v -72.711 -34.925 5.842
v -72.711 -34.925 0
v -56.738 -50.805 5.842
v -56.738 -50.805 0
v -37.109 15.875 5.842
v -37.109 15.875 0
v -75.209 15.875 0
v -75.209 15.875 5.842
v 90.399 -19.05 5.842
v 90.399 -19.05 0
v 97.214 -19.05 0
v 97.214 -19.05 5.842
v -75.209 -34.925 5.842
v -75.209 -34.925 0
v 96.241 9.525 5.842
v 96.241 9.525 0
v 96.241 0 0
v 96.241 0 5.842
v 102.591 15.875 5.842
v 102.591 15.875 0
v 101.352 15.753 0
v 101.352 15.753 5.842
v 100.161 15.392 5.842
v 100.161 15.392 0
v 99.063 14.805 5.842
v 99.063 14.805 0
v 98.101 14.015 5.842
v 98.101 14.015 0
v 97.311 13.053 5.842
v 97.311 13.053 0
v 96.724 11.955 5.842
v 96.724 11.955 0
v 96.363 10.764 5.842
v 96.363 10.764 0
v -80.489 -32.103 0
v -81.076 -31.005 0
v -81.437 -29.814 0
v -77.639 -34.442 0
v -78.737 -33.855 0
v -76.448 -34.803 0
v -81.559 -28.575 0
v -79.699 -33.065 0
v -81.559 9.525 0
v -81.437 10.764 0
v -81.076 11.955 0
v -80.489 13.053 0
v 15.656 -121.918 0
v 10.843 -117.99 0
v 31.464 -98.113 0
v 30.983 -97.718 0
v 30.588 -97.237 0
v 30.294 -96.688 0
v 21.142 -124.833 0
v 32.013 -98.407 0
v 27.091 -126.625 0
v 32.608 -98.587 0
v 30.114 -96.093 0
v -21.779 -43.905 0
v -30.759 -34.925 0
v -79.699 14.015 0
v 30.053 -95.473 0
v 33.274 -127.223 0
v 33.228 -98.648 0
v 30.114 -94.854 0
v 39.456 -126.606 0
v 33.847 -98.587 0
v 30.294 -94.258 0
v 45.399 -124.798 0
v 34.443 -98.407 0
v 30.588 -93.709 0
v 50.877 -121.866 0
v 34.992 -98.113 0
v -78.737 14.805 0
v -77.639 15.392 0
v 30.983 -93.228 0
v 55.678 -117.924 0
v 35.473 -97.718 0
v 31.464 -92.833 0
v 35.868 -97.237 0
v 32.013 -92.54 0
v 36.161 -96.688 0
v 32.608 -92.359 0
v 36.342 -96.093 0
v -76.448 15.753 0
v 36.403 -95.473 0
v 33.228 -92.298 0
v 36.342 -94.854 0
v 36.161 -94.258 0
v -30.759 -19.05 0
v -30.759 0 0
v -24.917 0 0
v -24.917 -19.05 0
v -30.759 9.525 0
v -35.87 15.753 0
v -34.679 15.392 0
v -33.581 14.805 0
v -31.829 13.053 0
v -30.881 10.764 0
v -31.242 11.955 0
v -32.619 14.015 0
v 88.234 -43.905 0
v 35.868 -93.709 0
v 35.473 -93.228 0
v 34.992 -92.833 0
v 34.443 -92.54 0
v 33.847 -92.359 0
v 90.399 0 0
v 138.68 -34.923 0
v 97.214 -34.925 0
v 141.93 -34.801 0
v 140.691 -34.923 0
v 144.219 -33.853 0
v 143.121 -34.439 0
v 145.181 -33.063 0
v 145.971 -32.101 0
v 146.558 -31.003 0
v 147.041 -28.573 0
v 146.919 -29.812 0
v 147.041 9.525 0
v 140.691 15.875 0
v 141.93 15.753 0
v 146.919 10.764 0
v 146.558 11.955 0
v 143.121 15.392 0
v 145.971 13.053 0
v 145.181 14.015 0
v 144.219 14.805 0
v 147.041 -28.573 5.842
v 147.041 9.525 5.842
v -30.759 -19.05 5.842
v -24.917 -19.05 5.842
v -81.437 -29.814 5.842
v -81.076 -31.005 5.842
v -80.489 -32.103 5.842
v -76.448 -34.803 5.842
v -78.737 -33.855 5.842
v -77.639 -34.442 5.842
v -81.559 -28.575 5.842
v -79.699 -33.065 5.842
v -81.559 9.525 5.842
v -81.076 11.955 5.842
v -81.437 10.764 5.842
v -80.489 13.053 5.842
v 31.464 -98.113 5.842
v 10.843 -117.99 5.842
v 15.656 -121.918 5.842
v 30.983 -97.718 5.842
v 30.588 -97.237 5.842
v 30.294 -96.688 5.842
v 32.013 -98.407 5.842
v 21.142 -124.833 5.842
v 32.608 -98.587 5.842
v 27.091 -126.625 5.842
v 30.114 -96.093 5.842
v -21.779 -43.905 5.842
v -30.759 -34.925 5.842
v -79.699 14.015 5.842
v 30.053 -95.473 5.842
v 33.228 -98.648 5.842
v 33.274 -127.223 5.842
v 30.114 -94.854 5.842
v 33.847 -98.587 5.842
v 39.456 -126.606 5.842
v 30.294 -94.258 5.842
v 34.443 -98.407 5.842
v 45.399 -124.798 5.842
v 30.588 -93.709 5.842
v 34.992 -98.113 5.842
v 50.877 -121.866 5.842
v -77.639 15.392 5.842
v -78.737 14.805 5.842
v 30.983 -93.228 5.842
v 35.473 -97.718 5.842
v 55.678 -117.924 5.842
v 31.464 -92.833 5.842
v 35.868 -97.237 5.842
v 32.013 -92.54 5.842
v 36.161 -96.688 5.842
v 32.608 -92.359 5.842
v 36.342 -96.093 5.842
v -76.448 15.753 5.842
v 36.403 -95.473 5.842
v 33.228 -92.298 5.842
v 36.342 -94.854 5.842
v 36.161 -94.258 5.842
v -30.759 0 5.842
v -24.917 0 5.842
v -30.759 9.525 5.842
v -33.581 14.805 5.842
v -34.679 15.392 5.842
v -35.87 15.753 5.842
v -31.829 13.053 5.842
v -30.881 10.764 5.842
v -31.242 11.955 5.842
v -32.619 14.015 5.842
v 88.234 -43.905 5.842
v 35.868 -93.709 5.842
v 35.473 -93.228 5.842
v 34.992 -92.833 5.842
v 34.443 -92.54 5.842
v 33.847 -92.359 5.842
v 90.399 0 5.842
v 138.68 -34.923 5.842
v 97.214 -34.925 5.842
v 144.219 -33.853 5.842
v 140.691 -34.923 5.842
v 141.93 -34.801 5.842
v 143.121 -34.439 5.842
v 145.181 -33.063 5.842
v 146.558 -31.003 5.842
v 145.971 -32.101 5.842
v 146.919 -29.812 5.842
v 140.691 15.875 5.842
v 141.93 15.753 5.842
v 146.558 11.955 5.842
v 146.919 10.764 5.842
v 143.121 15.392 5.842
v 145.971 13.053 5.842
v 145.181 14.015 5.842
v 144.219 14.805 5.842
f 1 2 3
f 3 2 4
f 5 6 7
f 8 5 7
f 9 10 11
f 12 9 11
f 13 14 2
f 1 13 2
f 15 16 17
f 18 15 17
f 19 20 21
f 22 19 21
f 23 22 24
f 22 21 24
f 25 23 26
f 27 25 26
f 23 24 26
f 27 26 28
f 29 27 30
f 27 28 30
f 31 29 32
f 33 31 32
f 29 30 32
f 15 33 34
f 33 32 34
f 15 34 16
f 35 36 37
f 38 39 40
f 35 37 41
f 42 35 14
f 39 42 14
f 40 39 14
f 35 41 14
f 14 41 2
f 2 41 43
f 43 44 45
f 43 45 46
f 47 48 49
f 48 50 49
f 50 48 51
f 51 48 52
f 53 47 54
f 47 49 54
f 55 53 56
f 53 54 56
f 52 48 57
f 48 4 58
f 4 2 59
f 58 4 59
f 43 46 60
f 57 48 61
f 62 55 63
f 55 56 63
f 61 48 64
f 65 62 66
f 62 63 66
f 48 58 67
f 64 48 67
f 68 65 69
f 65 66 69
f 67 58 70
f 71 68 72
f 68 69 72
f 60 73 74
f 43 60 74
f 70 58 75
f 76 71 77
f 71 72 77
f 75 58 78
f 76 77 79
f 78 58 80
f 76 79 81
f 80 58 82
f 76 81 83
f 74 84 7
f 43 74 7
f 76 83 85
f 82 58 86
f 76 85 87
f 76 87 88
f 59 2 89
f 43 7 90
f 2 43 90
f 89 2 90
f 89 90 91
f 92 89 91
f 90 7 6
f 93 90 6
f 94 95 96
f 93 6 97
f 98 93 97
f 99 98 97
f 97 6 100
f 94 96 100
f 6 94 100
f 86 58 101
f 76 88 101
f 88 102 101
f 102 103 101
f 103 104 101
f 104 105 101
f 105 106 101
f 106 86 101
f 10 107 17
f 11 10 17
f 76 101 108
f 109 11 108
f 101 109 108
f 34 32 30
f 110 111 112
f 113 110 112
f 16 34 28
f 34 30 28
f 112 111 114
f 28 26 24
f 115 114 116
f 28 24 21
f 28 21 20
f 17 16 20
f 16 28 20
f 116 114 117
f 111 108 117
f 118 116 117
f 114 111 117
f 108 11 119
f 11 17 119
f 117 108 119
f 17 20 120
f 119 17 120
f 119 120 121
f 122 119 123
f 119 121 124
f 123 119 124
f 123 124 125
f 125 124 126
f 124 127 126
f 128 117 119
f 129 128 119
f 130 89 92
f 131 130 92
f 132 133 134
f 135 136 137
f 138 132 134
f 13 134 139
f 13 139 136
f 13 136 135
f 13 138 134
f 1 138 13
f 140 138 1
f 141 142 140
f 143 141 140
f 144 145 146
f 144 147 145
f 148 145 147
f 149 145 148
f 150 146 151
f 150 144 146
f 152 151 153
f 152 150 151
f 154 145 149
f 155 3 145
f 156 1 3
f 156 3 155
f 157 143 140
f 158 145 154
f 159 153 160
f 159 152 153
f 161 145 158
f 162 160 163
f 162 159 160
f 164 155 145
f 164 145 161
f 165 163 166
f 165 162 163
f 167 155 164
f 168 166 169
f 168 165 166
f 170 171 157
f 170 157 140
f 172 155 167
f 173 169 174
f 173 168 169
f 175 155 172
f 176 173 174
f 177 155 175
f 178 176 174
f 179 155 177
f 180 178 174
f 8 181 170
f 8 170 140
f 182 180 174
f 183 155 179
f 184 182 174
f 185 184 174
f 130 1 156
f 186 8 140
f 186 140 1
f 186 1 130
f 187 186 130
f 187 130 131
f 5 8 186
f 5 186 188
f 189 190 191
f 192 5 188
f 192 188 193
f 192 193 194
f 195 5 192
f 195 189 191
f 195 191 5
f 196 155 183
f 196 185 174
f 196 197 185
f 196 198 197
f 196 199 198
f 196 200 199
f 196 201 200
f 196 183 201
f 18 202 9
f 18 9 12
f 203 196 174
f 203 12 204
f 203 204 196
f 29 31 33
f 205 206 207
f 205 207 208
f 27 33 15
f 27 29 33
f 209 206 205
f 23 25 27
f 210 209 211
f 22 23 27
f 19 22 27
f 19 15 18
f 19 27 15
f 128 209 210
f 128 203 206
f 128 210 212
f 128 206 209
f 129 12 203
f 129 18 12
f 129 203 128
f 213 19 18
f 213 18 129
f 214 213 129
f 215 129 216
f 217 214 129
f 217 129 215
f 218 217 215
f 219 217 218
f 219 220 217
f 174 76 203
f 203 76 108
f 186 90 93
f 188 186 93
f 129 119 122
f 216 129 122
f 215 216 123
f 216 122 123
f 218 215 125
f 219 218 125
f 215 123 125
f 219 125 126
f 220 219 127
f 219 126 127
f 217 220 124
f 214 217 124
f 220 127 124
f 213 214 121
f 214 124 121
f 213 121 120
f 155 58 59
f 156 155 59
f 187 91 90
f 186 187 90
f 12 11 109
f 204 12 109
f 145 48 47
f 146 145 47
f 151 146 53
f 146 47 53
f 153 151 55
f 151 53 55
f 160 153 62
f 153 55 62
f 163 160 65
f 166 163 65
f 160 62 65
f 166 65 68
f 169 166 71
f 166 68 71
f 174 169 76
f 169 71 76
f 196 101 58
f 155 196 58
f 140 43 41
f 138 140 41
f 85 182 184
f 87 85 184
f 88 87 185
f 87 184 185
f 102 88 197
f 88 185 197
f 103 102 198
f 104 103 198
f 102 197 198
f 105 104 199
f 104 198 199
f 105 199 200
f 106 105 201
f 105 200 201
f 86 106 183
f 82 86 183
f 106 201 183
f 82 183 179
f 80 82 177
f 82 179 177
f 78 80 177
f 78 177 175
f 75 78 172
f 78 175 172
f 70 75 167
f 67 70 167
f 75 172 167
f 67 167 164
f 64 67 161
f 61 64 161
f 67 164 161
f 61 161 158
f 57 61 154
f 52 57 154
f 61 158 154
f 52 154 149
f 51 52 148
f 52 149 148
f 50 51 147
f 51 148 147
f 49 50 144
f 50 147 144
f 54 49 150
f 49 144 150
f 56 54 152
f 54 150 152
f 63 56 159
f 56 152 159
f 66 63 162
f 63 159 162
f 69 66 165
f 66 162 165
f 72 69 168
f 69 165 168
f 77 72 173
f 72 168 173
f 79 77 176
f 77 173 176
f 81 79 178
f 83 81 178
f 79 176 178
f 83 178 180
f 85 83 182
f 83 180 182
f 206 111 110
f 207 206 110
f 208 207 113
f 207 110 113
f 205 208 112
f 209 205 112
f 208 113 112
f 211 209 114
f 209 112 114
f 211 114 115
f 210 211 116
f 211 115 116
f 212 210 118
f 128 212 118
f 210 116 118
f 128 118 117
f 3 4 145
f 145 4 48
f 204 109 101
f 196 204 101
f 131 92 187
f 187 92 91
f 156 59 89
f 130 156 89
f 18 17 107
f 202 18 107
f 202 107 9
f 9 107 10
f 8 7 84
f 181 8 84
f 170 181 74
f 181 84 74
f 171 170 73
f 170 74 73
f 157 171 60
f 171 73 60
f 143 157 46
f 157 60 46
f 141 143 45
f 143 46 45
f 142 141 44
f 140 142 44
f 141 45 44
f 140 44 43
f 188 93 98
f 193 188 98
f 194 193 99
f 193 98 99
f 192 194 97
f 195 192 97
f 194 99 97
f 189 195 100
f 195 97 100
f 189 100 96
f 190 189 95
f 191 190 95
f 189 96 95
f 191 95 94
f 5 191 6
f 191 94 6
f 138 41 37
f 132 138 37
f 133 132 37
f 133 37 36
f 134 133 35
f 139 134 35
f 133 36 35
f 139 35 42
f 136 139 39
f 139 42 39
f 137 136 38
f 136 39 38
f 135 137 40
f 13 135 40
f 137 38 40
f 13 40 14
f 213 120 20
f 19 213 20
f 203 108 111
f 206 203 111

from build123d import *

# Parameters (mm, degrees)
F1_DEPTH = 5.842
F2_R     = 3.175
F3_DEPTH = 5.842


# Not quite as in the source:
# - a feature names something its author has since deleted; it is built from what else it names


with BuildPart() as f1:
    # F0 (on Top) → F1 (new body)
    with BuildSketch(Plane.XY):
        with BuildLine():
            Line((-37.108954253, 15.875), (-43.458954253, 15.875))
            Line((-43.458954253, 15.875), (-75.208954253, 15.875))
            ThreePointArc((-75.208954253, 15.875), (-79.6990823135, 14.0151280605), (-81.558954253, 9.525))
            Line((-81.558954253, 9.525), (-81.558954253, -28.575))
            ThreePointArc((-81.558954253, -28.575), (-79.6990823135, -33.0651280605), (-75.208954253, -34.925))
            Line((-75.208954253, -34.925), (-72.710875161, -34.925))
            Line((-72.710875161, -34.925), (-56.7378558105, -50.8045013442))
            Line((-56.7378558105, -50.8045013442), (10.8431089825, -117.9897966054))
            ThreePointArc((10.8431089825, -117.9897966054), (21.0344920397, -66.1580316621), (64.9777384297, -95.4733389685))
            ThreePointArc((64.9777384297, -95.4733389685), (62.5609135869, -107.6235379461), (55.6783787323, -117.9239792712))
            Line((55.6783787323, -117.9239792712), (110.9403548131, -62.6620031905))
            Line((110.9403548131, -62.6620031905), (138.6796593377, -34.9226986659))
            Line((138.6796593377, -34.9226986659), (140.691045747, -34.9226986659))
            ThreePointArc((140.691045747, -34.9226986659), (145.1811738076, -33.0628267264), (147.041045747, -28.5726986659))
            Line((147.041045747, -28.5726986659), (147.041045747, 9.525))
            ThreePointArc((147.041045747, 9.525), (145.1811738076, 14.0151280605), (140.691045747, 15.875))
            Line((140.691045747, 15.875), (108.941045747, 15.875))
            Line((108.941045747, 15.875), (102.591045747, 15.875))
            ThreePointArc((102.591045747, 15.875), (98.1009176865, 14.0151280605), (96.241045747, 9.525))
            Line((96.241045747, 9.525), (96.241045747, 0))
            Line((96.241045747, 0), (90.399045747, 0))
            Line((90.399045747, 0), (90.399045747, -19.05))
            Line((90.399045747, -19.05), (97.2144311123, -19.05))
            Line((97.2144311123, -19.05), (97.2144311123, -34.925))
            Line((97.2144311123, -34.925), (88.2341749912, -43.9052561211))
            Line((88.2341749912, -43.9052561211), (-21.7786981319, -43.9052561211))
            Line((-21.7786981319, -43.9052561211), (-30.758954253, -34.925))
            Line((-30.758954253, -34.925), (-30.758954253, -19.05))
            Line((-30.758954253, -19.05), (-24.916954253, -19.05))
            Line((-24.916954253, -19.05), (-24.916954253, 0))
            Line((-24.916954253, 0), (-30.758954253, 0))
            Line((-30.758954253, 0), (-30.758954253, 9.525))
            ThreePointArc((-30.758954253, 9.525), (-32.6188261924, 14.0151280605), (-37.108954253, 15.875))
        make_face()
        with BuildLine():
            ThreePointArc((64.9777384297, -95.4733389685), (21.0344920397, -66.1580316621), (10.8431089825, -117.9897966054))
            ThreePointArc((10.8431089825, -117.9897966054), (33.2743467834, -127.2233047585), (55.6783787323, -117.9239792712))
            ThreePointArc((55.6783787323, -117.9239792712), (62.5609135869, -107.6235379461), (64.9777384297, -95.4733389685))
        make_face()
    extrude(amount=F1_DEPTH)

    # F2 (on face) → F3 (cut, through all)
    with BuildSketch(Plane.XY.offset(5.842)):
        with Locations((33.2277384297, -95.4733389685)):
            Circle(F2_R)
    extrude(amount=-F3_DEPTH, mode=Mode.SUBTRACT)


solid = f1.part
